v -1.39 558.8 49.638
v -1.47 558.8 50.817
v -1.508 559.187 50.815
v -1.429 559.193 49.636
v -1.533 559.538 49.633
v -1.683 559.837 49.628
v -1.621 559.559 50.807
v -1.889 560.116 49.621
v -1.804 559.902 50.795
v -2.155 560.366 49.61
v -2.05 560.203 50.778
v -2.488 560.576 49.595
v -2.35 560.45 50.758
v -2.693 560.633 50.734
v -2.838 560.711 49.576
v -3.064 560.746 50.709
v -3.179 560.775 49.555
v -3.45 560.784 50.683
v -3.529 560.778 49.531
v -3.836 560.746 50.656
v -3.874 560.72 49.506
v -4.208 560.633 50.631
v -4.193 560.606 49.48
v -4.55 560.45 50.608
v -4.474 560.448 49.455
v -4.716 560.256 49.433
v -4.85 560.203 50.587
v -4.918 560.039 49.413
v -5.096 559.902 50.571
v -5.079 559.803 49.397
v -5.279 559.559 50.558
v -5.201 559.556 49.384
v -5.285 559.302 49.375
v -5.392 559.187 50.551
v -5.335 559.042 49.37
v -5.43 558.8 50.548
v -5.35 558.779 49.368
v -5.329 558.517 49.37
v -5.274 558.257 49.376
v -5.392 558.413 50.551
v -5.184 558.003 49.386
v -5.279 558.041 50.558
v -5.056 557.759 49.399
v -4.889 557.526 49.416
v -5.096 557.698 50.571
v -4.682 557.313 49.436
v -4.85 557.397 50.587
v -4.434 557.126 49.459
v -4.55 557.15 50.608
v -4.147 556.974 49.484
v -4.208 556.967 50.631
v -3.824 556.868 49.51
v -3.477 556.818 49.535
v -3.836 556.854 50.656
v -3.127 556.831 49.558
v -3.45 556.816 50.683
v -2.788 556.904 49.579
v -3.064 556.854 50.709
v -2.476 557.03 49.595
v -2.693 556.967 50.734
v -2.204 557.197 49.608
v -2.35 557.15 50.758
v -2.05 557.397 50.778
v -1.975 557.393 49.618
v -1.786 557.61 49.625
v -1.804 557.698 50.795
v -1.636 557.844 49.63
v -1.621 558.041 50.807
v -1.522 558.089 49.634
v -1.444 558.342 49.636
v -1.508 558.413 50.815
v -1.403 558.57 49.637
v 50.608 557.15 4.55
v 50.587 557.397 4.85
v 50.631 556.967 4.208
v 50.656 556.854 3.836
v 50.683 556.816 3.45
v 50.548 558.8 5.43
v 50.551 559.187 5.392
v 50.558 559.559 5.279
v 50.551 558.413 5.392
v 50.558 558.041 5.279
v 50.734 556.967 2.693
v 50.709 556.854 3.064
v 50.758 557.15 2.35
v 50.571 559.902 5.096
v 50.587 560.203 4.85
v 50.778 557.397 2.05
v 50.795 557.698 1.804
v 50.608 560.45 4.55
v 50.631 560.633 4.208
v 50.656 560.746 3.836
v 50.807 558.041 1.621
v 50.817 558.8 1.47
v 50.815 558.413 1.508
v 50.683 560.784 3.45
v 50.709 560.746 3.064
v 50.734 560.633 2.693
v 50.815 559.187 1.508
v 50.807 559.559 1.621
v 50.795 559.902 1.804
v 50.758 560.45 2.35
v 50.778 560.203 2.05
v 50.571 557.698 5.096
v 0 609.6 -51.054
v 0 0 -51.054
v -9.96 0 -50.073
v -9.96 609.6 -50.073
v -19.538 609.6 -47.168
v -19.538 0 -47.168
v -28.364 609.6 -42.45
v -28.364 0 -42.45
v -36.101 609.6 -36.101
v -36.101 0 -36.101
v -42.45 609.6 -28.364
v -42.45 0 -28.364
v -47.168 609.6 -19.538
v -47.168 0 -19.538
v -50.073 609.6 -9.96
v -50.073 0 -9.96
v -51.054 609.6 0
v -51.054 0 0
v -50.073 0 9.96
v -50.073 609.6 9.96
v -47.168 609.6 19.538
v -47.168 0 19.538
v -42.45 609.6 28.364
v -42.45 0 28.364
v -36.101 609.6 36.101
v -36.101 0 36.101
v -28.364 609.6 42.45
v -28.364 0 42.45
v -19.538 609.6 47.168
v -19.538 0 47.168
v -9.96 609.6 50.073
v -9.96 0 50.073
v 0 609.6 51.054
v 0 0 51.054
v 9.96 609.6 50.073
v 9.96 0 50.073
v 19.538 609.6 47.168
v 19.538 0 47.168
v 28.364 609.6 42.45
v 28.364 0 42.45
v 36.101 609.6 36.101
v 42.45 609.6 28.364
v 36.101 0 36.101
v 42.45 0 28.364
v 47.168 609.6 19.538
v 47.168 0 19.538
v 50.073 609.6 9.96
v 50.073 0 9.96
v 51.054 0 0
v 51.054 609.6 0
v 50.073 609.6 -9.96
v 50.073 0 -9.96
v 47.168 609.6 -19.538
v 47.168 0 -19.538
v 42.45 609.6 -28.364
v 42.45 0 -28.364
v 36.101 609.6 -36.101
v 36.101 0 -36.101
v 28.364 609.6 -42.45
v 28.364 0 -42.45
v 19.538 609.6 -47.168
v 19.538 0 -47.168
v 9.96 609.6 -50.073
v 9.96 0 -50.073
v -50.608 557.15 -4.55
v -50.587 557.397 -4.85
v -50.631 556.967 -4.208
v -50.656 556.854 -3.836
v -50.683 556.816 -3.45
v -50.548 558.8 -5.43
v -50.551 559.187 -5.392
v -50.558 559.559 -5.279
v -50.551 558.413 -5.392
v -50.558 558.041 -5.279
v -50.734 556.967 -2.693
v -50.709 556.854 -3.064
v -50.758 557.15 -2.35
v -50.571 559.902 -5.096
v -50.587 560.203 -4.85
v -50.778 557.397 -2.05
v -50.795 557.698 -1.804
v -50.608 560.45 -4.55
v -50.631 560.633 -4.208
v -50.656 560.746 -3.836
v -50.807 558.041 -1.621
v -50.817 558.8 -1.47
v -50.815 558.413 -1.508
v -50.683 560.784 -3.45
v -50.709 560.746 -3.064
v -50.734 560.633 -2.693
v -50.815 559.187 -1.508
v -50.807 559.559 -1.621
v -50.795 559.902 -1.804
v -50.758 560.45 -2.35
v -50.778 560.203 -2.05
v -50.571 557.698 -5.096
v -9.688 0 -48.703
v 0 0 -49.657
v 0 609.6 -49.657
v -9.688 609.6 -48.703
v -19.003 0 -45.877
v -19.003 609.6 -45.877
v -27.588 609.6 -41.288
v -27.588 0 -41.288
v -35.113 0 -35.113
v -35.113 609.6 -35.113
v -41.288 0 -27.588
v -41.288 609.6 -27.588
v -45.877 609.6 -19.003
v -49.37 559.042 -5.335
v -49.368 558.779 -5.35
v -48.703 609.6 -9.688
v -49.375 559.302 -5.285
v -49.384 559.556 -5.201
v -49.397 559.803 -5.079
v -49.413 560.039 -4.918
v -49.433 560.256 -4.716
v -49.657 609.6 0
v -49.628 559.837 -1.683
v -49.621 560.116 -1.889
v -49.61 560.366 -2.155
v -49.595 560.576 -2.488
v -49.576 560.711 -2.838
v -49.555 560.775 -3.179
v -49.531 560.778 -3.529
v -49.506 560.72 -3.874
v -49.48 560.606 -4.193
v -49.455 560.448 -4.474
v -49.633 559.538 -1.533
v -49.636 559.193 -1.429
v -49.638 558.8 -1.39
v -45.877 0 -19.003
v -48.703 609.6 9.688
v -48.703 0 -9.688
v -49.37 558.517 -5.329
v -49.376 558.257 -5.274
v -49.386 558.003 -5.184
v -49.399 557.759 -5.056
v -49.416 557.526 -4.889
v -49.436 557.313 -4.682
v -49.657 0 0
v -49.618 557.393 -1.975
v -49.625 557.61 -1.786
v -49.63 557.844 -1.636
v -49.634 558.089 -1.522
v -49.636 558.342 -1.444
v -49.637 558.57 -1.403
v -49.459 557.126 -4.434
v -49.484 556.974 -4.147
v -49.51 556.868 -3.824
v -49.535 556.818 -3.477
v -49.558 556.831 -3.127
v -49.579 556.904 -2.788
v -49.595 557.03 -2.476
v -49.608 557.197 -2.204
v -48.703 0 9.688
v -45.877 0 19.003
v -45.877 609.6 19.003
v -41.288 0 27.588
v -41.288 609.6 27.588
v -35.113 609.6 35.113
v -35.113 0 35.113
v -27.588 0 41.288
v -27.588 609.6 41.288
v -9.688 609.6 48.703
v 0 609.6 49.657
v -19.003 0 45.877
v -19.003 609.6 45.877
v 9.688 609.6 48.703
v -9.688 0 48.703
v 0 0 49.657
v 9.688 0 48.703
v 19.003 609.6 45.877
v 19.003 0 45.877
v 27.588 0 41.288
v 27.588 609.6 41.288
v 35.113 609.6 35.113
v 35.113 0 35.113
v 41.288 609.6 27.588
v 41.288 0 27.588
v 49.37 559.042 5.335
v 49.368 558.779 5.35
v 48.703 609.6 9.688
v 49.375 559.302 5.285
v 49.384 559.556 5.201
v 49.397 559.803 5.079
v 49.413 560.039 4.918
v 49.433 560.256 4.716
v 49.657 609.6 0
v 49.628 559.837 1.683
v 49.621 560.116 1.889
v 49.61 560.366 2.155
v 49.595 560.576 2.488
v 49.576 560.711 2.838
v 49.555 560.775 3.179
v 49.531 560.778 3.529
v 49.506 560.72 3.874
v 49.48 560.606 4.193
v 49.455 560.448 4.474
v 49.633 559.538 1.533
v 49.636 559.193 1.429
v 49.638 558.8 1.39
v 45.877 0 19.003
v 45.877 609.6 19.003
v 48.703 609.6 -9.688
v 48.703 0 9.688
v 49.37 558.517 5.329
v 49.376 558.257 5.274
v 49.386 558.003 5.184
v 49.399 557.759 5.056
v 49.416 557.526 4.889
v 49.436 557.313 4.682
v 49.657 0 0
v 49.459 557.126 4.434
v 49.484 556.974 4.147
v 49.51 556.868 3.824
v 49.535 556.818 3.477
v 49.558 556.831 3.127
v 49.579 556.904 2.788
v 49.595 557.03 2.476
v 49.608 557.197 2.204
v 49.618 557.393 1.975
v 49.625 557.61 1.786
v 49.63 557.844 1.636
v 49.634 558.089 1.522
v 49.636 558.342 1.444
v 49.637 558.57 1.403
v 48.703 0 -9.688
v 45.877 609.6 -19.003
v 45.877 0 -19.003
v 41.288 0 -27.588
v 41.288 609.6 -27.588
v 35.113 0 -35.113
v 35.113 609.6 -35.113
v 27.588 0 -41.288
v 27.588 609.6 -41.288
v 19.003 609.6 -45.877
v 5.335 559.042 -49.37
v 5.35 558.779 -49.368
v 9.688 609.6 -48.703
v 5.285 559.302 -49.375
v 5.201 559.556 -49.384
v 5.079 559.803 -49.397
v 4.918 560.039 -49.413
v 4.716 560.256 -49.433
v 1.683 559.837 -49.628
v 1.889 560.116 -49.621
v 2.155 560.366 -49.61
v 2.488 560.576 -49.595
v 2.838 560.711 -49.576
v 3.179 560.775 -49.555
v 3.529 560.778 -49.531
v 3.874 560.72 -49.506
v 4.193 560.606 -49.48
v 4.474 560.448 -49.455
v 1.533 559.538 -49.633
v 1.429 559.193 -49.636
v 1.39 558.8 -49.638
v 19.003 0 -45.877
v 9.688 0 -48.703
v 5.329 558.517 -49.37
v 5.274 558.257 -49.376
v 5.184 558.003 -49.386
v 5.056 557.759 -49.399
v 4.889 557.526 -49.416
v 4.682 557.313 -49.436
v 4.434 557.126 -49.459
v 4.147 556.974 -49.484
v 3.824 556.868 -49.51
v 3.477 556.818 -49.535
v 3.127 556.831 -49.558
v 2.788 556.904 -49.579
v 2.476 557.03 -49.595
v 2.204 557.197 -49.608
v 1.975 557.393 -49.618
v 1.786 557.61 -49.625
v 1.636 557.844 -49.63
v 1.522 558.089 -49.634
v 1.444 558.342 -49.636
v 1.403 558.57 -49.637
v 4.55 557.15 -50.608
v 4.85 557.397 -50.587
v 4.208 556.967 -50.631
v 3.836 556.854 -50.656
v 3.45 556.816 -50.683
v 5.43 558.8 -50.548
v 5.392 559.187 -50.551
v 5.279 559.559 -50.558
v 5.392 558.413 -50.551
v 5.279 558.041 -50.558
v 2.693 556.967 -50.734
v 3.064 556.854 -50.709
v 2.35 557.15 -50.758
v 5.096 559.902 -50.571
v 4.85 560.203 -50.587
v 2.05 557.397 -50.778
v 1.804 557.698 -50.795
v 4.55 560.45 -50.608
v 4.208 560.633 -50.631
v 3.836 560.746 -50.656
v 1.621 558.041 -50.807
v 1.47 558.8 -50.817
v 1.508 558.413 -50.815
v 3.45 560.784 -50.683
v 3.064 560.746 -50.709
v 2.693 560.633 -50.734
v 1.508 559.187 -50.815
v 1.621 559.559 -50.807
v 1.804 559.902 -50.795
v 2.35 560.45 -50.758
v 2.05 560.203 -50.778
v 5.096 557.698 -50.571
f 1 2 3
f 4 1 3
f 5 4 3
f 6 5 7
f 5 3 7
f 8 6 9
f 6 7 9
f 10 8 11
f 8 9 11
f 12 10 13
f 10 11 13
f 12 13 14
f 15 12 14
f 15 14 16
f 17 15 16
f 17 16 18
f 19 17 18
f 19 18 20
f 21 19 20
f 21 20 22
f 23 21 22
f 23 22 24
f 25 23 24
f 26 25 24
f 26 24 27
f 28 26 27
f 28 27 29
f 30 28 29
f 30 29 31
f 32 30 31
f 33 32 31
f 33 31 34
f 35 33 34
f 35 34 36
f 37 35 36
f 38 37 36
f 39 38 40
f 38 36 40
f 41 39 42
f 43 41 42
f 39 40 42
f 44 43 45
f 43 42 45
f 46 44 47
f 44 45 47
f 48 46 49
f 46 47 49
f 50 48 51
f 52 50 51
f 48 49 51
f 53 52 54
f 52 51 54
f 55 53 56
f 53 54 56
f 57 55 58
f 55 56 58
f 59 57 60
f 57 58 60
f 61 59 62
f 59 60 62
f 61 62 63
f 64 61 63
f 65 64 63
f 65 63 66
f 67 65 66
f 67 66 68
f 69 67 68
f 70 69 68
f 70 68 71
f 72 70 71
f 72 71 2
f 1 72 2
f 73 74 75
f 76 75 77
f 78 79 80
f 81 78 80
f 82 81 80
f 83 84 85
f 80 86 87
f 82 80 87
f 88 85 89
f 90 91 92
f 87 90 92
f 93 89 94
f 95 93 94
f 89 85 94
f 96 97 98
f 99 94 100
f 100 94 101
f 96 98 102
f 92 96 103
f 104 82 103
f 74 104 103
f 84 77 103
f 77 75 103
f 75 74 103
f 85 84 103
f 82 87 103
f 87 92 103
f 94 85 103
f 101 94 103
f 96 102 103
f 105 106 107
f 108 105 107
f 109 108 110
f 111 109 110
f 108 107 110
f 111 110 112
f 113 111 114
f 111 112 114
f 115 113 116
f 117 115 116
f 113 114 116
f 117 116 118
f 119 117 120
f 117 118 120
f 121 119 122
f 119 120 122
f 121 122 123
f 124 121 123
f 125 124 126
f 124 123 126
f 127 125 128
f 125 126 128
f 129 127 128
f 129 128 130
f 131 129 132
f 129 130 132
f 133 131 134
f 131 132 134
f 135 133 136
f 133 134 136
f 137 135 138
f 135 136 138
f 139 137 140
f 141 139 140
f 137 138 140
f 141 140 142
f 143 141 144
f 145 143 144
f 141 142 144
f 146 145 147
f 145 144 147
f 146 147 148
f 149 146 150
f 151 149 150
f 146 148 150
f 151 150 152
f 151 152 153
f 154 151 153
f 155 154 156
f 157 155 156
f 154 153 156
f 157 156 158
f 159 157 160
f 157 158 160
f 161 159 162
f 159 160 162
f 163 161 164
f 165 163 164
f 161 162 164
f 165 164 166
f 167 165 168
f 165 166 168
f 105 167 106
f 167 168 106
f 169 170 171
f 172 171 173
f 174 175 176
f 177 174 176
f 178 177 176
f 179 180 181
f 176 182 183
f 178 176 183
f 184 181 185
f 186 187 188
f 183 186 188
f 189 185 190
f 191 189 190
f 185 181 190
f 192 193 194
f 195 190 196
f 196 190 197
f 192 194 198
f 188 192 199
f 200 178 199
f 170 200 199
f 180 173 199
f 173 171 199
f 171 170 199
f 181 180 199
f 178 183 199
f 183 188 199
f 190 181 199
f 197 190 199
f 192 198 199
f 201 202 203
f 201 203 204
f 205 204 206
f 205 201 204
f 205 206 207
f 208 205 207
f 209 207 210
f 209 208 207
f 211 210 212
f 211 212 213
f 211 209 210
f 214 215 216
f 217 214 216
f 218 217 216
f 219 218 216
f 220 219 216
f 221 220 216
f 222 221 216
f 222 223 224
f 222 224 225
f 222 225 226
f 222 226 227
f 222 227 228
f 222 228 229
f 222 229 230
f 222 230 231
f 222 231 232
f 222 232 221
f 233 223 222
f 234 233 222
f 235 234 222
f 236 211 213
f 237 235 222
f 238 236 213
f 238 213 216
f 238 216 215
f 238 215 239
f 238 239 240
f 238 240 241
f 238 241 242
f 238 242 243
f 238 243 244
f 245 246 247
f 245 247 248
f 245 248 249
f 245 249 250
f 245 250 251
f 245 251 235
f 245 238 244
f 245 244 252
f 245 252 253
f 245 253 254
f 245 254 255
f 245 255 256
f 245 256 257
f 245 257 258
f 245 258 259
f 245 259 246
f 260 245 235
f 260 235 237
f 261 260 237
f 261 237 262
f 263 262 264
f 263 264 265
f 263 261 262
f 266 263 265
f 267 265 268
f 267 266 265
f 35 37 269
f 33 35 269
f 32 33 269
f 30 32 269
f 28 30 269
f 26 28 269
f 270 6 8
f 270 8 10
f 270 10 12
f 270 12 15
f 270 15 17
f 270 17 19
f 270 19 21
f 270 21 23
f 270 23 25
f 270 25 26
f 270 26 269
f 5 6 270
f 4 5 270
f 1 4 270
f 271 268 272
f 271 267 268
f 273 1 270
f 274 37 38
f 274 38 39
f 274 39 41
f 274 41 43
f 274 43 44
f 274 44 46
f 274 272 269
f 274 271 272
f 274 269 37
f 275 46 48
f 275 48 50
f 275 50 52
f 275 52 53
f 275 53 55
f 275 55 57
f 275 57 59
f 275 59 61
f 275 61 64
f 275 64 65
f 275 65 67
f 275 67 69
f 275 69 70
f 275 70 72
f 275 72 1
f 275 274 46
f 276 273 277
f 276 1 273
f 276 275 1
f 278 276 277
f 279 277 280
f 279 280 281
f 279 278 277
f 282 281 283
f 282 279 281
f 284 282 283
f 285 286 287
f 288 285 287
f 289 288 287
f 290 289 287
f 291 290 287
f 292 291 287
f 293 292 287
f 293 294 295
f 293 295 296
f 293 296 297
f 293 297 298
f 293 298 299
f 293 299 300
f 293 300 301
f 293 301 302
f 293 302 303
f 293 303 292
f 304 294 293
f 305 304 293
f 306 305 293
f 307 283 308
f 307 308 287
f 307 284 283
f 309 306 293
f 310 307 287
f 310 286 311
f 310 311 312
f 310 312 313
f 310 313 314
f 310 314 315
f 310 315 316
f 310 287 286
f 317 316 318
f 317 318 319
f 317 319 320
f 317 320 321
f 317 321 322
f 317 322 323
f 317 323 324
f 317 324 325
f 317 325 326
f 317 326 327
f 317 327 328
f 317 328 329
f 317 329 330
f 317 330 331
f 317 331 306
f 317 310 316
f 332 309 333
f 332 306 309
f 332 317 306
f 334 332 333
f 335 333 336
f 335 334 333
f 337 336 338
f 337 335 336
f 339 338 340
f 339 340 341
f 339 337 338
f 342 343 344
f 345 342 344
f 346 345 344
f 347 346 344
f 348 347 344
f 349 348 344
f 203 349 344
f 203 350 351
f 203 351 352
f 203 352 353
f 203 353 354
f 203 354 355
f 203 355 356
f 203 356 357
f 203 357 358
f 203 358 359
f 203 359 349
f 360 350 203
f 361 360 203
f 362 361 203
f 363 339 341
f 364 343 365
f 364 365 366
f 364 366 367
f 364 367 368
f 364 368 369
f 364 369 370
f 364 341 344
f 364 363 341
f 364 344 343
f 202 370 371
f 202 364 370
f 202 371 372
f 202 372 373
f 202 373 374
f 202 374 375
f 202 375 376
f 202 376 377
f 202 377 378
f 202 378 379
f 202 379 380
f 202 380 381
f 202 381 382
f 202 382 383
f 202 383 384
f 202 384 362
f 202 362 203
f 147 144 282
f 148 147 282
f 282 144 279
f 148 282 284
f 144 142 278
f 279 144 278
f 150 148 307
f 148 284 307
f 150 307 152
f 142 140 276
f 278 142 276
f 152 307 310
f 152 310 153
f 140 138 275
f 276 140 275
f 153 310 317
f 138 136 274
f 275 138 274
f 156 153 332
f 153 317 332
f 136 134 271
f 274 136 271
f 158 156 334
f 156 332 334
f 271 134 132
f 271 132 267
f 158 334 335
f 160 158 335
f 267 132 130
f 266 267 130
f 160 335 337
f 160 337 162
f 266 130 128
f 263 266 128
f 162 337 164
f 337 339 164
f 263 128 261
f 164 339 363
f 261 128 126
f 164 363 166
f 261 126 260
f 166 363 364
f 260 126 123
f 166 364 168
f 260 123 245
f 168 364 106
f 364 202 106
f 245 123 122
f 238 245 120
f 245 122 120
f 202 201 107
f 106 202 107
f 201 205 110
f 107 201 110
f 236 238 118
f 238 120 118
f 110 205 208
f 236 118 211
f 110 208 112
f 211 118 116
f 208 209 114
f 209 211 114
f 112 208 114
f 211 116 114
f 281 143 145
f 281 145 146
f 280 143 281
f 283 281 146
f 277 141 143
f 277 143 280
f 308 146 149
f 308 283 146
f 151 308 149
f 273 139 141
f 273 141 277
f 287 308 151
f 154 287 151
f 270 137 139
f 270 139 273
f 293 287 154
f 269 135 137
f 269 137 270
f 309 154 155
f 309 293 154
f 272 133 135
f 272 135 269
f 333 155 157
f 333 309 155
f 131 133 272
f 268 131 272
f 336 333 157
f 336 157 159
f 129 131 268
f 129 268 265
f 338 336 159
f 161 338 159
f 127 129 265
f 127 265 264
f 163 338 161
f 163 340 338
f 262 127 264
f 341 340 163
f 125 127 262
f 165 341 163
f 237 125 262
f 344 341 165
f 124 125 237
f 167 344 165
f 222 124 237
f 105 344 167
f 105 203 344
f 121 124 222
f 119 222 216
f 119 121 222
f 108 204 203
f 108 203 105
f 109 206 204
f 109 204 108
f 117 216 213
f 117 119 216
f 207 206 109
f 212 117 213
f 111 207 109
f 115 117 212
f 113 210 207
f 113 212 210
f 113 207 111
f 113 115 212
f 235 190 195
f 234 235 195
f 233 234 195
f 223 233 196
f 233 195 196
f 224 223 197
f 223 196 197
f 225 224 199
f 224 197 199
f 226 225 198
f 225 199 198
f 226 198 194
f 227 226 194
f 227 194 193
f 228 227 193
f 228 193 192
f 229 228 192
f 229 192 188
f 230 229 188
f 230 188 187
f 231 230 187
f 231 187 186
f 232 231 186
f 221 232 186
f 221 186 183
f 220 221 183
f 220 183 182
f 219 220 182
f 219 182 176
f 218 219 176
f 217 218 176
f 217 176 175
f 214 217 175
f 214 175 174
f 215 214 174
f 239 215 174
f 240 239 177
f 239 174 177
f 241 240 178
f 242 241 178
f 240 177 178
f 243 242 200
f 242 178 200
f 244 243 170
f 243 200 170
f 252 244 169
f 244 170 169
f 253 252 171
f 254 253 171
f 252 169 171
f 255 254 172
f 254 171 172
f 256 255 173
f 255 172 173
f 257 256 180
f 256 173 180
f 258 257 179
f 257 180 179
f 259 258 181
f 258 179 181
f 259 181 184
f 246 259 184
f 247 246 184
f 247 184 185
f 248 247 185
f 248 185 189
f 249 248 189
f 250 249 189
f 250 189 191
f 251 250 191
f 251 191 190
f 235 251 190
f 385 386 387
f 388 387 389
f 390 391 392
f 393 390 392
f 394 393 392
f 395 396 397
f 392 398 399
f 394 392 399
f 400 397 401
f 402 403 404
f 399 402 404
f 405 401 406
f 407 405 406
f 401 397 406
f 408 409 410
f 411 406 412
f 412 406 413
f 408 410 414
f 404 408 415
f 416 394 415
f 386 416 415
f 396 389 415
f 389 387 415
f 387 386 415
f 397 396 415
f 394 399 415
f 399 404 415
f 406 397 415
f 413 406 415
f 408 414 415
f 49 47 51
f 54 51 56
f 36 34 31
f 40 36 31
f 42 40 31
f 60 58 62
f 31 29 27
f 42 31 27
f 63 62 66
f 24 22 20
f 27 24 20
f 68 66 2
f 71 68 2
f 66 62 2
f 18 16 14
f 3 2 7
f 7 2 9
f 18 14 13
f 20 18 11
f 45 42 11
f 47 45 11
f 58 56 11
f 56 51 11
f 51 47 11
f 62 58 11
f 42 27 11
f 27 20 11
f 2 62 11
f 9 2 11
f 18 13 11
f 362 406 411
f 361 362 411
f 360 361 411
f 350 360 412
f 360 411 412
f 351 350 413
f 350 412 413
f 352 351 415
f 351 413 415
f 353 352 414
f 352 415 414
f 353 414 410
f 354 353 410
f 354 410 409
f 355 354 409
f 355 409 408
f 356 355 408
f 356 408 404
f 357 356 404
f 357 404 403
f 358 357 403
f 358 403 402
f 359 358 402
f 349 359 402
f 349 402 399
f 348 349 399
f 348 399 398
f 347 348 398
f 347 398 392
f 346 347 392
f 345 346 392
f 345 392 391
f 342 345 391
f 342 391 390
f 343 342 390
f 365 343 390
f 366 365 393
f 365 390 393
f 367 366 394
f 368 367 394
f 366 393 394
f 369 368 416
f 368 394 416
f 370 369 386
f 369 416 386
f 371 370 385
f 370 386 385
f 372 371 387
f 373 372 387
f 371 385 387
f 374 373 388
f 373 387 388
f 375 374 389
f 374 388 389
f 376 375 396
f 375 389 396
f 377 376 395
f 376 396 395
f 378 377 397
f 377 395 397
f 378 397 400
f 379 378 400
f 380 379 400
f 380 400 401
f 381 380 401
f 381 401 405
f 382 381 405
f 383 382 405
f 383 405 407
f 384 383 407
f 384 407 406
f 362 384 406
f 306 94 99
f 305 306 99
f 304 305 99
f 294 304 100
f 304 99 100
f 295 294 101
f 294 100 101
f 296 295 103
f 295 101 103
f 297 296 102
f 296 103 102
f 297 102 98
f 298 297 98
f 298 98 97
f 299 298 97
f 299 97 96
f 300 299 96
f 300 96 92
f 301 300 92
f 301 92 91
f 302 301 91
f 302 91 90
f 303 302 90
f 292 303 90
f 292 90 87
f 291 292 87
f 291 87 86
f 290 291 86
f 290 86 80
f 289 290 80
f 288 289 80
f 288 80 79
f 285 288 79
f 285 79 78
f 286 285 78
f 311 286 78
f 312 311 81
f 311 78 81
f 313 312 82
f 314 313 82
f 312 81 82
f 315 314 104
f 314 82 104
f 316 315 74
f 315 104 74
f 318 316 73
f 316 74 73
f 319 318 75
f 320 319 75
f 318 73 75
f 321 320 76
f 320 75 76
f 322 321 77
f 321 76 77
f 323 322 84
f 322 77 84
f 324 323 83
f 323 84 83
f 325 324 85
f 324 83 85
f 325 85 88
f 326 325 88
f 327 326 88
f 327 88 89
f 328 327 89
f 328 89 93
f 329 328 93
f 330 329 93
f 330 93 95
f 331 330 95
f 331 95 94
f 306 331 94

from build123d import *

# Parameters (mm, degrees)
SKETCH1_R           = 51.054
SKETCH1_R_2         = 49.657
BOSS_EXTRUDE1_DEPTH = 609.6
SKETCH2_R           = 1.984375
CUT_EXTRUDE1_DEPTH  = 12.7
CIRPATTERN1_COUNT   = 4


with BuildPart() as part:
    # Sketch1 → Boss-Extrude1 (new body)
    with BuildSketch(Plane(origin=(0, 0, 0), x_dir=(1, 0, 0), z_dir=(0, 1, 0))):
        with Locations(Location((0, 0, 0), (0, 0, 90))):
            Circle(SKETCH1_R)
        with Locations(Location((0, 0, 0), (0, 0, 90))):
            Circle(SKETCH1_R_2, mode=Mode.SUBTRACT)
    extrude(amount=BOSS_EXTRUDE1_DEPTH)

    # Sketch2 → Cut-Extrude1 (cut)
    with BuildSketch(Plane(origin=(122.899951256, 815.595371644, -42.551362721), x_dir=(-0.9976910351931784, 0, -0.067916112191174), z_dir=(0.067916112191174, 0, -0.9976910351931785))):
        with Locations((119.72625647, -256.795371644)):
            Circle(SKETCH2_R)
    cut_extrude1 = extrude(amount=-CUT_EXTRUDE1_DEPTH, mode=Mode.SUBTRACT)

    # CirPattern1: Cut-Extrude1 ×4 about axis
    cirpattern1_axis = Axis((0, 0, 0), (0, 1, 0))
    for i in range(1, CIRPATTERN1_COUNT):
        add(cut_extrude1.rotate(cirpattern1_axis, i * 360 / CIRPATTERN1_COUNT), mode=Mode.SUBTRACT)


solid = part.part
